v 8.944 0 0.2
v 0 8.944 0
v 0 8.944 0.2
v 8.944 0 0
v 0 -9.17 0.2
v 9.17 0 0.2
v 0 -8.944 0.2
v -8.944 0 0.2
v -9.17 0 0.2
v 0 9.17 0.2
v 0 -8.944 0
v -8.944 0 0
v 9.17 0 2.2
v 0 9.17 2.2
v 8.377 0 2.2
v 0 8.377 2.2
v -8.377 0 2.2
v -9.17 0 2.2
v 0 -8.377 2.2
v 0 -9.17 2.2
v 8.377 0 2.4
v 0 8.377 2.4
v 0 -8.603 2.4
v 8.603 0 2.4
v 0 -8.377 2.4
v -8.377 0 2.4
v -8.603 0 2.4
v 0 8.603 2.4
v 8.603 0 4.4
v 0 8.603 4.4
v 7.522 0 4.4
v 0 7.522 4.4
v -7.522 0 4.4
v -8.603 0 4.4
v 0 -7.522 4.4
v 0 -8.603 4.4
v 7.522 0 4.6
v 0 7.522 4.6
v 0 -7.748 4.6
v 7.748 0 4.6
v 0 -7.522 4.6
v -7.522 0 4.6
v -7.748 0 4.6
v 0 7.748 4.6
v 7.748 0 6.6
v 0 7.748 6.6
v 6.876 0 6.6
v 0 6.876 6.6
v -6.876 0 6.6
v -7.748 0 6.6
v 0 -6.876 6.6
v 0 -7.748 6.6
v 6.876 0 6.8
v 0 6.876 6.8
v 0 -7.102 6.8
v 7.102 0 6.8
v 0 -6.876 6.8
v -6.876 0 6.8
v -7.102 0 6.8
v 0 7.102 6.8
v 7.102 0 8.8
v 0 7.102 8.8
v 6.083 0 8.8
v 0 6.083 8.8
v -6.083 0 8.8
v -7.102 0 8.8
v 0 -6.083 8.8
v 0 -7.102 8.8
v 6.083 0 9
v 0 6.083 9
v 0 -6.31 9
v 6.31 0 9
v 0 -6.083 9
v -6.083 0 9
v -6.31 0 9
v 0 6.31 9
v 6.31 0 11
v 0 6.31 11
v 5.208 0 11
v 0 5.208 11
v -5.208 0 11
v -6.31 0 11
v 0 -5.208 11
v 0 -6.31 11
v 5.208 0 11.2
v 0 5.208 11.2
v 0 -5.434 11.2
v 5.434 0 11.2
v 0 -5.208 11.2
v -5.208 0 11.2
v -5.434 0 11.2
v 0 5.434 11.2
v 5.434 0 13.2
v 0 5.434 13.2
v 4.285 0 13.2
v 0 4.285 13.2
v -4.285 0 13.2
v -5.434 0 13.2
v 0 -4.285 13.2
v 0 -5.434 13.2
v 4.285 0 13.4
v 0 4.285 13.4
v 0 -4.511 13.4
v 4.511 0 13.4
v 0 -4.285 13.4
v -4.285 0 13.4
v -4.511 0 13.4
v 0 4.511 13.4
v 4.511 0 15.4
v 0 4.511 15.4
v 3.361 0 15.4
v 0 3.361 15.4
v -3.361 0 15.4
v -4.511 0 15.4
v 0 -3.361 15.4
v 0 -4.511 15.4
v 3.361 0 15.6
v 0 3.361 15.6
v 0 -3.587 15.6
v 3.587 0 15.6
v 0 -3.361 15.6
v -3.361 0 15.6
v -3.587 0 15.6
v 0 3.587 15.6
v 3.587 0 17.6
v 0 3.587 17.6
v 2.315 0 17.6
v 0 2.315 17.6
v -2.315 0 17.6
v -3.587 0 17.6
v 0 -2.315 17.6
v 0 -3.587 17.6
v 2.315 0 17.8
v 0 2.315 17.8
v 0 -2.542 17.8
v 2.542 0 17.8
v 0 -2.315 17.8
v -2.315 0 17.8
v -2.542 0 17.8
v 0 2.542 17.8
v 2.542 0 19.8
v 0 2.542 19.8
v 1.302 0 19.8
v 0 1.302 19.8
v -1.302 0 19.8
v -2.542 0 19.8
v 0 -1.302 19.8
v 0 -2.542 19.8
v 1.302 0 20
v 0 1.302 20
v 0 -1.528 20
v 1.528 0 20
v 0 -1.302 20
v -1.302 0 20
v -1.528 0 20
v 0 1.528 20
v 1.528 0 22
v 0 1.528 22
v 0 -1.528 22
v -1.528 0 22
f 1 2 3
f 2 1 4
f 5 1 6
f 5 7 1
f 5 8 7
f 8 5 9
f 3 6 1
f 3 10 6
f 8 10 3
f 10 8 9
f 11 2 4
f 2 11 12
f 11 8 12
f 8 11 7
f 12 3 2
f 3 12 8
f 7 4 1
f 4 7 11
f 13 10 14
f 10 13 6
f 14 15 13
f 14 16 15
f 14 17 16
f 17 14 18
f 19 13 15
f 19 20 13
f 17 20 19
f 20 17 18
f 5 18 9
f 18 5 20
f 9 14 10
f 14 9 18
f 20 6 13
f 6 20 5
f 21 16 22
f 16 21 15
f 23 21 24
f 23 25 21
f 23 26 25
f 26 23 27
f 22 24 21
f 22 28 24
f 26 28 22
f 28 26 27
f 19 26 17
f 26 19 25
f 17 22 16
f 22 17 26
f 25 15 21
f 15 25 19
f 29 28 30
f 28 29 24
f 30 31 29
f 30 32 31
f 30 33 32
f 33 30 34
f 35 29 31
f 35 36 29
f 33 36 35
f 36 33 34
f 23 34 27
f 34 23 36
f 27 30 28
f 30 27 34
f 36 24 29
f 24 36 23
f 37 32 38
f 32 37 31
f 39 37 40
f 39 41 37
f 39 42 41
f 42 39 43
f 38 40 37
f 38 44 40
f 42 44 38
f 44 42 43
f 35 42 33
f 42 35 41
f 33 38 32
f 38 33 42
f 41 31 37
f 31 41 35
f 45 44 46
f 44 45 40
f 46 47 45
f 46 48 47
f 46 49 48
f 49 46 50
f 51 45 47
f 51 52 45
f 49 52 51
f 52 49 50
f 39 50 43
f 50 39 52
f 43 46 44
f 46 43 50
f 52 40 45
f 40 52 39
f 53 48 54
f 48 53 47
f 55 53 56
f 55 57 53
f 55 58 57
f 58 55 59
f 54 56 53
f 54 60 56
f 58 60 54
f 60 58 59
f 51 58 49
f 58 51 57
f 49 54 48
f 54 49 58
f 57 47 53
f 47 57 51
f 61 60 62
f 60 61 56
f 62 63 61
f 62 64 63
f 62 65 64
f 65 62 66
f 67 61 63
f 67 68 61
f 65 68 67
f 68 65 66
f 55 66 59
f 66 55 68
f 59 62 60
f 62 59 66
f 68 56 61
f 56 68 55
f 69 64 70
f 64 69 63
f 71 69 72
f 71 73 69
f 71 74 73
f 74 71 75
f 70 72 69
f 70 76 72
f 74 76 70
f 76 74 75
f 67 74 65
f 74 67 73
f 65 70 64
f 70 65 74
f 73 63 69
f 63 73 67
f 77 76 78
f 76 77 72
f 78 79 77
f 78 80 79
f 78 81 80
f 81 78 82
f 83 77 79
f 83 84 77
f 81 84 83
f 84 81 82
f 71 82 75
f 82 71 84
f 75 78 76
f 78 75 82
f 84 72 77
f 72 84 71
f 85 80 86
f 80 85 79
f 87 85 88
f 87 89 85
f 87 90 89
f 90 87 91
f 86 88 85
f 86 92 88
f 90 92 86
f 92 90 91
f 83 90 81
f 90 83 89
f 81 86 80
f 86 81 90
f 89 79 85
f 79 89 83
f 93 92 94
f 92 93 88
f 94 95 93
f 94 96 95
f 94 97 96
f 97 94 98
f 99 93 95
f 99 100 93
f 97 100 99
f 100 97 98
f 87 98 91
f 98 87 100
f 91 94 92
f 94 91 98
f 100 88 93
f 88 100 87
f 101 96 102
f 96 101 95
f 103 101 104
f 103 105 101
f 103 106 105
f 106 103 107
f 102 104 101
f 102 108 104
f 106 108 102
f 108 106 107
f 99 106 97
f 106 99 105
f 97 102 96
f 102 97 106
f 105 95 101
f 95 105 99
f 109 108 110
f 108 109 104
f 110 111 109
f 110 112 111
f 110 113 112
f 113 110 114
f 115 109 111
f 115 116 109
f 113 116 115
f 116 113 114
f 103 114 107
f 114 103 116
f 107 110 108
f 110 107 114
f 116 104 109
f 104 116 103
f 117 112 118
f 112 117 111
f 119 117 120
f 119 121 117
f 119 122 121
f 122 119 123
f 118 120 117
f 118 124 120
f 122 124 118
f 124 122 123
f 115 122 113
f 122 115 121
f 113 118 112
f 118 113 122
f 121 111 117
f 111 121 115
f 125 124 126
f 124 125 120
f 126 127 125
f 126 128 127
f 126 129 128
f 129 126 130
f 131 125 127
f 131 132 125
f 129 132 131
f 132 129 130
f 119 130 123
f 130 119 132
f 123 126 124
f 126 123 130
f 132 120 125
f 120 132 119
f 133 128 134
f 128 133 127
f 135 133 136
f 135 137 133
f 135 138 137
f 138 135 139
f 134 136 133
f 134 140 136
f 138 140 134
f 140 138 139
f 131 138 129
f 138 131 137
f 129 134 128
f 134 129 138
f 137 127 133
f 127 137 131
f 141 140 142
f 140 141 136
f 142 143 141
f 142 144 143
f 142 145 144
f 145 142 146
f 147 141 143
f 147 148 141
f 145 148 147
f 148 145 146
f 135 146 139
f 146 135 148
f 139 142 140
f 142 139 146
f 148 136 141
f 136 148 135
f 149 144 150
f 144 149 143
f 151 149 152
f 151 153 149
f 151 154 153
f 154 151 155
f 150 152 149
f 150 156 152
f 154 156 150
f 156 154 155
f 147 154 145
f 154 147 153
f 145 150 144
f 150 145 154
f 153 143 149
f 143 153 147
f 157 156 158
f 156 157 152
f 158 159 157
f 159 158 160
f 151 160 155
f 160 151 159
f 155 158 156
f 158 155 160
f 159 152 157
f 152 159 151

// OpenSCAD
/*[How to use this calibration tool]*/
/*
This program uses Slic3r flow math to approximate the layer print time of square slices, therefore it's best to use this to calibrate filament profiles in Slic3r or its derivatives.

How to prepare your slicer:
I. Print settings:
    1. Set the number of top and bottom solid layers to 0.
    2. Disable the setting "Extra perimeters if needed:"
    3. Set fill pattern to a zig-zag-like pattern ((aligned) rectilinear, monotonic).
    4. Set fill density to 100%.
II. Filament settings:
    5. Disable the setting "Enable auto cooling".
    6. Set your minimum fan speed to the value of "max_fan_speed" when calibrating for "slowdown_below_layer_time" or to the value of "min_fan_speed" when calibrating for "fan_below_layer_time".

What to do here:
Transfer your slicer parameter values to the corresponding parameter under the "Customizer" tab.
"Time" parameters define how the calibration will proceed.
"Program parameters" affect the inner workings of this tool.
How to callibrate the dilation parameter:
    1. Set dilation to 1.000.
    2. Render the model (F6).
    3. Export the resulting model (F7).
    4. Find the ratio between the slicer print time and the time calculated by this tool (slicer / openscad), if your slicer compensates for custom gcodes, subtract them from the slicer print time.
    5. Set dilation to this new value.
    6. If you deem it necessary, iterate over steps 1-5 however much you like. Keep in mind, new dilation is the product of current/old dilatation and the ratio of print times.

How to calculate "OpenSCAD_print_time":
    Under console you'll find a sequence of "ECHO: %f1, %f2, %f3", where %f1 is the segment number from bottom to top. The total calculated print time is calculated as the sum of (layers_per_segment * %f2 + %f3) for al segments.
    E.g.: layers_per_segment = 10,
        ECHO: 1, 10, 9.88012
        ECHO: 2, 9.11362, 8.8164
        ECHO: 3, 8.03068, 7.75042
        ECHO: 4, 7.0716, 6.80701
        ECHO: 5, 5.90847, 5.81443
        ECHO: 6, 5, 4.77318
        ECHO: 7, 3.92449, 3.8362
        ECHO: 8, 3.0694, 2.87583
        ECHO: 9, 2, 1.92376
        ECHO: 10, 1, 0.864268
    will result in a total print time of 10m 4.52s.
    For a quicker estimation, calculate
        (layers_per_segment + 1) * number_of_segments * (first_segment_layer_time + final_segment_layer_time) / 2.
    
When importing the model into your slicer, DO NOT rotate it. If you want to rotate it, change the "fill angle" value in both your slicer and this calibration tool.

How to analyse printed test models:
    The best layer time will be that of the smallest segment with the cleanest edges (no or practically no curling at the corners) and the cleanest seams.
    When calibrating for "slowdown_below_layer_time":
        If all segments have clean edges and clean seams, consider decreasing the value of "max_fan_speed".
        If no segments have clean edges or clean seams, consider increasing the value of "max_fan_speed" if possible, or increasing layer time even more.
    When calibrating for "fan_below_layer_time":
        If all segments have clean edges and clean seams, consider decreasing the value of "min_fan_speed" if possible, or decreasing layer time.
        If no segments have clean edges or clean seams, consider decreasing layer time (will increase filament usage), or increasing "min_fan_speed".
*/
// By ticking this box you agree to the terms and conditions :-)
AGREE = false; // Ticking this doesn't do anything. Or does it?? *Vsauce music intensifies*

/*[Extruder]*/

nozzle_diameter = 0.40; // [0.2, 0.25, 0.3, 0.4, 0.5, 0.6, 0.8, 1, 1.2, 1.4, 1.8]


/*[Layers and perimeters]*/

// Non-positive values are mapped to 0.5 * [nozzle diameter]. Values smaller than 0.25 * [nozzle diameter] are mapped to 0.25 * [nozzle diameter]. Values greater than 0.75 * [nozzle diameter] are mapped to 0.75 * [nozzle diameter]. 
layer_height = 0.2; // 0.01

// Values undergo the same mapping as values for [layer height].
initial_layer_height = 0.2; // 0.01

// I don't know what a reasonable upper limit would be. Keep in mind that with too many perimeters some segments from the top dissapear.
perimeters = 3; // [0:1:50]


/*[Speed]*/

// Non-positive values are mapped to 100mm/s.
default_speed = 100; // 0.1

// Non-positive values are mapped to [default speed].
perimeter_speed = 0; // 0.1

// Non-positive values are mapped to [default speed].
small_perimeter_speed = 0; // 0.1

// Non-positive values are mapped to [default speed].
external_perimeter_speed = 0; // 0.1

// Non-positive values are mapped to [default speed].
infill_speed = 0; //0.1


/*[Acceleration]*/

// Non-positive values are mapped to 1000mm/s^2.
default_acceleration = 1000; // [0:1:30000]

// Non-positive values are mapped to [default acceleration].
perimeter_acceleration = 0; // [0:1:30000]

// Non-positive values are mapped to [default acceleration].
external_perimeter_acceleration = 0; // [0:1:30000]

// Non-positive values are mapped to [default acceleration].
infill_acceleration = 0; // [0:1:30000]


/*[Extrusion width]*/

// Non-positive values are mapped to 1.125 * [nozzle diameter];. Values smaller than 0.6 * [nozzle diameter] are mapped to 0.6 * [nozzle diameter]. Values greater than 2 * [nozzle diameter] are mapped to 2 * [nozzle diameter].
default_extrusion_width = 0; // 0.01

// Non-positive values are mapped to [default extrusion width]. Values smaller than 0.6 * [nozzle diameter] are mapped to 0.6 * [nozzle diameter]. Values greater than 2 * [nozzle diameter] are mapped to 2 * [nozzle diameter].
perimeter_extrusion_width = 0; // 0.01

// Values undergo the same mapping as values for [perimeter extrusion width].
external_perimeter_extrusion_width = 0; // 0.01

// Values undergo the same mapping as values for [perimeter extrusion width].
infill_extrusion_width = 0; // 0.01


/*[Infill]*/

// Let's have some fun! As long as the difference between this value and the slicer value is an integer multiple of 90, you're good to go. :)
fill_angle = 765; // 0.1

// This is just a toggle for which of the following two values to use when calculating [infill overlap]. Most people use percentages, but if you happen to be one of those fre... someone who uses an absolute distance, I present you the option to do so.
infill_overlap_is_in_percentages = true;

infill_overlap_percentage = 25; // [0:0.1:50]

// Negative values are mapped to 0. Values greater than 0.5 * [perimeter extrusion width] are mapped to 0.5 * [perimeter extrusion width].
infill_overlap_mm = 0.1;  //0.0001


/*[Time]*/

// Values smaller than 2 are mapped to 2.
number_of_segments = 10; // 1

// Non-positive values are mapped to 0.1s.
final_segment_layer_time = 1; // 0.1

// Values not greater than [final segment layer time] are mapped to [final segment layer time] + 0.1 * ([number of segments] - 1).
first_segment_layer_time = 10; // 0.1

// Values smaller than 2 are mapped to 2.
layers_per_segment = 10; // 1

/*[Program parameters]*/

// Defines the number of iterations when calculating the side length of a square given a layer time goal.
number_of_iterations = 64; // [1:1:256]

// Since this program uses an approximation of the slicer behaviour, the time calculated by this program and the time calculated by an actual slicer might differ. To calculate this value find the average over all layers of the following expression: [current_dilation] * [slicer_layer_time] / [openscad_layer_time]
dilation = 1.0; // 0.001


/*[Hidden]*/
//Parameter manipulation/processing and defining additional/hardcoded variables.

//** Layers and perimeters **//
l_h = layer_height <= 0 ? 0.5 * nozzle_diameter :
    (layer_height < 0.25 * nozzle_diameter ? 0.25 * nozzle_diameter :
        (layer_height > 0.75 * nozzle_diameter ? 0.75 * nozzle_diameter : layer_height));

i_l_h = initial_layer_height <= 0 ? 0.5 * nozzle_diameter :
    (initial_layer_height < 0.25 * nozzle_diameter ? 0.25 * nozzle_diameter :
        (initial_layer_height > 0.75 * nozzle_diameter ? 0.75 * nozzle_diameter : initial_layer_height));

//** Speed **//
v_d = default_speed > 0 ? default_speed : 100;

v_p = perimeter_speed > 0 ? perimeter_speed : v_d;

v_sp = small_perimeter_speed > 0 ? small_perimeter_speed : v_d;

v_ep = external_perimeter_speed > 0 ? external_perimeter_speed : v_d;

v_i = infill_speed > 0 ? infill_speed : v_d;

//** acceleration **//
a_d = default_acceleration > 0 ? default_acceleration : 1000;

a_p = perimeter_acceleration > 0 ? perimeter_acceleration : a_d;

a_ep = external_perimeter_acceleration > 0 ? external_perimeter_acceleration : a_d;

a_i = infill_acceleration > 0 ? infill_acceleration : a_d;

//** Extrusion width **//
w_d = default_extrusion_width > 0
    ? (default_extrusion_width < 0.6 * nozzle_diameter
        ? 0.6 * nozzle_diameter
        : (default_extrusion_width > 2 * nozzle_diameter
            ? 2 * nozzle_diameter
            : default_extrusion_width
        )
    )
    : 1.125 * nozzle_diameter;

w_p = perimeter_extrusion_width > 0
    ? (perimeter_extrusion_width < 0.6 * nozzle_diameter
        ? 0.6 * nozzle_diameter
        : (perimeter_extrusion_width > 2 * nozzle_diameter
            ? 2 * nozzle_diameter
            : perimeter_extrusion_width
        )
    )
    : w_d;

w_ep = external_perimeter_extrusion_width > 0
    ? (external_perimeter_extrusion_width < 0.6 * nozzle_diameter
        ? 0.6 * nozzle_diameter
        : (external_perimeter_extrusion_width > 2 * nozzle_diameter
            ? 2 * nozzle_diameter
            : external_perimeter_extrusion_width
        )
    )
    : w_d;

w_i = infill_extrusion_width > 0
    ? (infill_extrusion_width < 0.6 * nozzle_diameter
        ? 0.6 * nozzle_diameter
        : (infill_extrusion_width > 2 * nozzle_diameter
            ? 2 * nozzle_diameter
            : infill_extrusion_width
        )
    )
    : w_d;

// Inner most perimeter
w_ip = perimeters > 1 ? w_p : w_ep;

//** Infill **//
i_o = infill_overlap_is_in_percentages
    ? 0.01 * infill_overlap_percentage * w_ip
    : (infill_overlap_mm < 0
        ? 0
        : (infill_overlap_mm > 0.5 * w_ip ? 0.5 * w_ip : infill_overlap_mm));

//** Time **//
n_o_s = max(2, number_of_segments);

fin_slt = max(0.1, final_segment_layer_time);

fir_slt = first_segment_layer_time > fin_slt ? first_segment_layer_time : fin_slt + 0.1 * (n_o_s - 1);

lps = max(2, layers_per_segment);

//** Additional **//

// Google Slic3r flow math.
// Holy hell!
perimeter_overlap = (1 - 0.25 * PI) * l_h;

// A radius smaller than or equal to 6.5mm sounds rather weird when we're working with squares, not circles.
small_perimeter_length = 13 * PI;

// Variables needed for initial approximation of the width of squares
a = 1 / (w_i * v_i);

b = perimeters > 0 ? 4 * (1 / v_ep + (perimeters - 1) / v_p) : 0;


//** Functions **//

// Returns the sum of the values in an array.
function sum(array) =
    len(array) == 1
        ? array[0]
        : array[0] + sum([for (i = [1:len(array)-1]) array[i]]);

/*
   Calculates the time it would take to traverse a distance of [length], where initial and final velocities are 0, target velocity is [speed] and given acceleration [acceleration].
   Using following formulas:
        v = a * t,
        d = 1/2 * a * t^2,
   we reach target velocity at t = v / a,
   substituting t in the second formula we get the distance the nozzle traverses when accelerating:
        d = 1/2 * a * (v / a)^2 = 1/2 * v^2 / a.
   Given we need to accelerate and decelerate, the minimum length to reach the target velocity becomes
        l = 2 * d = v^2 / a.
   The cumulative time it takes to accelerate untill target velocity and to decelerate to standstill is
        2 * v / a.
   For lengths smaller than l we only use the formula
        d = 1/2 * a * t^2
   which gives
        t = sqrt(2 * d / a).
   For half the length we accelerate, for the other we decelerate, which gives
        t = 2 * sqrt(d / a).
*/
function line_time(length, speed, acceleration) =
    let (
        l = speed ^ 2 / acceleration
    )
    length >= l
        ? (length - l) / speed + 2 * speed / acceleration
        : length > 0
            ? 2 * sqrt(length / acceleration)
            : 0;

function actual_time(square_width) =
    let(
        is_small_perimeter_ep = 4 * (square_width - w_ep) <= small_perimeter_length,
        
        t_ep = perimeters > 0
            ? 4 * line_time(square_width - w_ep, is_small_perimeter_ep ? v_sp : v_ep, is_small_perimeter_ep ? a_p : a_ep)
            : 0,
        w1 = perimeters > 0 ? square_width - w_ep : square_width,
        
        t_p_arr = perimeters > 1
            ? [for (i = [1:1:perimeters - 1])
                let(
                    w = w1 - i * (w_p - perimeter_overlap),
                    is_small_perimeter_p = 4 * w <= small_perimeter_length
                )
                w > 0
                    ? 4 * line_time(w, is_small_perimeter_p ? v_sp : v_p, a_p)
                    : 0]
            : [0],
            
        t_p = sum(t_p_arr),
            
        w2 = perimeters > 1
            ? w1 - (perimeters - 1) * w_p + (perimeters - 2) *  perimeter_overlap + 2 * i_o
            : perimeters == 1
                ? w1 + 2 * i_o
                : square_width,
        
        n = floor((w2 - perimeter_overlap) / (w_i - perimeter_overlap)),
        
        t_i = n > 0
            ? n * line_time(w2 - w_i, v_i, a_i) + (n - 1) * line_time(w_i - perimeter_overlap, v_i, a_i)
            : 0
    )
    dilation * (t_ep + t_p + t_i);

function get_square_width(time, depth) =
    depth == 0
        ? let(c = -time) 0.5 * (sqrt(b ^ 2 - 4 * a * c) - b) / a
        : let(
            w = get_square_width(time, depth - 1),
            t = actual_time(w)
            )
            0.5 * (1 + time / t) * w;

//** Modules **//

module tower(){
    height = lps * l_h;
    rotate([0,0,fill_angle])
    for (n = [0:1:n_o_s-1]) {
        time = fir_slt - n * (fir_slt - fin_slt) / (n_o_s - 1);
        square_width = get_square_width(time, number_of_iterations);
        echo(n+1, actual_time(square_width), actual_time(square_width - 0.8 * nozzle_diameter));
        
        h = n == 0 ? i_l_h : l_h;
        
        translate([0,0, n * (height + l_h) + 0.5 * i_l_h])
        cube([square_width - 0.8 * nozzle_diameter, square_width - 0.8 * nozzle_diameter, h], center=true);
        
        translate([0,0, (n + 0.5) * (height + l_h) + 0.5 * i_l_h])
        cube([square_width, square_width, height], center=true);
    }
}

tower();
